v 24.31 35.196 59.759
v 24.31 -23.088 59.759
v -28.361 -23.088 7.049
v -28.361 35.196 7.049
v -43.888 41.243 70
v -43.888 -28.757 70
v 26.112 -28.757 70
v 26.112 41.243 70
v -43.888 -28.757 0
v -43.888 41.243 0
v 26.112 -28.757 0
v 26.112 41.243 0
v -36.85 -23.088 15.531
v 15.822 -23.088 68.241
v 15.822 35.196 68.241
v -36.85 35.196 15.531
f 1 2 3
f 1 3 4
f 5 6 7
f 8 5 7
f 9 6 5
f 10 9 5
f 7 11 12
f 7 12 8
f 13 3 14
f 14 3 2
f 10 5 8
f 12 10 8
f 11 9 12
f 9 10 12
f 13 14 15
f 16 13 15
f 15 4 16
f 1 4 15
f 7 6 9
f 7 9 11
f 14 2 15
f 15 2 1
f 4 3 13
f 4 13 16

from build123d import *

# Parameters (mm, degrees)
F2_W           = 63.9534269655
F2_H           = 63.9534269655
F3_DEPTH       = 64
F7_W           = 70
F7_H           = 70
F8_DEPTH       = 70
F6_W           = 58.2842652881
F6_H           = 74.5155771047
F9_DEPTH       = 5.7
F9_DEPTH_BACK  = 6
F10_DEPTH      = 6
F10_DEPTH_BACK = 6


with BuildPart() as f3:
    # F2 (on Top) → F3 (new body)
    with BuildSketch(Plane.XY):
        with Locations((-11.9109315234, 3.2196889264)):
            Rectangle(F2_W, F2_H)
    extrude(amount=F3_DEPTH)

    # F7 (on face) → F8 (join)
    with BuildSketch(Plane.XZ.offset(28.7570245564)):
        with Locations((-8.8876450062, 35)):
            Rectangle(F7_W, F7_H)
    extrude(amount=-F8_DEPTH)


with BuildPart() as f9:
    # F6 (on face) → F9 (new body, two sides)
    with BuildSketch(Plane(origin=(-21.9597969133, 0, 21.9438166887), x_dir=(0, 1, 0), z_dir=(0.7073641101, 0, -0.7068493586))) as f9_sk:
        with Locations((6.054269765, 22.1969996005)):
            Rectangle(F6_W, F6_H)
    extrude(amount=F9_DEPTH)
    extrude(f9_sk.sketch, amount=-F9_DEPTH_BACK)

    # F6 (on face) → F10 (join, two sides)
    with BuildSketch(Plane(origin=(-21.9597969133, 0, 21.9438166887), x_dir=(0, 1, 0), z_dir=(0.7073641101, 0, -0.7068493586))) as f10_sk:
        with Locations((6.054269765, 22.1969996005)):
            Rectangle(F6_W, F6_H)
    extrude(amount=F10_DEPTH)
    extrude(f10_sk.sketch, amount=-F10_DEPTH_BACK)


solid = Compound([f3.part, f9.part])
